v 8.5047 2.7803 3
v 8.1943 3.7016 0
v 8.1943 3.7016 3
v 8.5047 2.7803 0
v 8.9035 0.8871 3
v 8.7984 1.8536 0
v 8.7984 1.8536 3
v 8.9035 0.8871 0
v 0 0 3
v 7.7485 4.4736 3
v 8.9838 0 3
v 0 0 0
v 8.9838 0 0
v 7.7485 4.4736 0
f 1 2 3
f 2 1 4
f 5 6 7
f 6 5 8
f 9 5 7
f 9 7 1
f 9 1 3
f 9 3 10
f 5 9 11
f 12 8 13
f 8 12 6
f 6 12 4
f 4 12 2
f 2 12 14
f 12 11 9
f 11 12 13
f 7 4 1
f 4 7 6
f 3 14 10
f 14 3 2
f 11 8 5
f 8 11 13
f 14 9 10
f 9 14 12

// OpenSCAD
toleranta=1;//toleranta la desenare

//______________cu diferenta
module felie_pizza_diference(diametru,grosime,unghi_felie)
{
    
    difference(){
        cylinder(h=grosime,r=diametru/2);
        translate([-diametru/2-toleranta,-diametru/2-toleranta,-toleranta])     cube([diametru+2*toleranta, diametru/2+toleranta,grosime+2*toleranta        ]);       
        rotate([0,0,30]) translate([-diametru/2-toleranta,0,-toleranta]) cube([     diametru+2*toleranta, diametru/2+toleranta,grosime+2*toleranta]);   
    }
}    
//enn______________cu diferenta   
module felie_pizza_intersection(diametru,grosime,unghi_felie)
{
    
    intersection(){
        cylinder(h=grosime,r=diametru/2);
        translate([-diametru/2-toleranta,0,-toleranta]) cube([diametru+2*toleranta, diametru/2+toleranta,grosime+2*toleranta]);  
        rotate([0,0,-(90-unghi_felie)]) cube([diametru/2+toleranta, diametru/2+toleranta,grosime+2*toleranta]);      
        
        }
    }
        
 module felie_pizza_intersection_1(diametru,grosime,unghi_felie)
{
    intersection()//intersectie de 2 intersectii
    {
            intersection()//intersectie 1
        {
            cylinder(h=grosime,r=diametru/2);
            translate([-diametru/2-toleranta,0,-toleranta]) cube([diametru+2*           toleranta, diametru/2+toleranta,grosime+2*toleranta]);  
        }
        
    rotate([0,0,-(180-unghi_felie)])  intersection()//intersectie2 rotita 150
        { 
            cylinder(h=grosime,r=diametru/2);
            translate([-diametru/2-toleranta,0,-toleranta]) cube([diametru+2*       toleranta, diametru/2+toleranta,grosime+2*toleranta]);  
        }
       
    }      
}  
//felie_pizza_diference(diametru=30,grosime=3,unghi_felie=30);
//felie_pizza_intersection(diametru=18,grosime=3,unghi_felie=30);  
felie_pizza_intersection_1(diametru=18,grosime=3,unghi_felie=30); 
    
